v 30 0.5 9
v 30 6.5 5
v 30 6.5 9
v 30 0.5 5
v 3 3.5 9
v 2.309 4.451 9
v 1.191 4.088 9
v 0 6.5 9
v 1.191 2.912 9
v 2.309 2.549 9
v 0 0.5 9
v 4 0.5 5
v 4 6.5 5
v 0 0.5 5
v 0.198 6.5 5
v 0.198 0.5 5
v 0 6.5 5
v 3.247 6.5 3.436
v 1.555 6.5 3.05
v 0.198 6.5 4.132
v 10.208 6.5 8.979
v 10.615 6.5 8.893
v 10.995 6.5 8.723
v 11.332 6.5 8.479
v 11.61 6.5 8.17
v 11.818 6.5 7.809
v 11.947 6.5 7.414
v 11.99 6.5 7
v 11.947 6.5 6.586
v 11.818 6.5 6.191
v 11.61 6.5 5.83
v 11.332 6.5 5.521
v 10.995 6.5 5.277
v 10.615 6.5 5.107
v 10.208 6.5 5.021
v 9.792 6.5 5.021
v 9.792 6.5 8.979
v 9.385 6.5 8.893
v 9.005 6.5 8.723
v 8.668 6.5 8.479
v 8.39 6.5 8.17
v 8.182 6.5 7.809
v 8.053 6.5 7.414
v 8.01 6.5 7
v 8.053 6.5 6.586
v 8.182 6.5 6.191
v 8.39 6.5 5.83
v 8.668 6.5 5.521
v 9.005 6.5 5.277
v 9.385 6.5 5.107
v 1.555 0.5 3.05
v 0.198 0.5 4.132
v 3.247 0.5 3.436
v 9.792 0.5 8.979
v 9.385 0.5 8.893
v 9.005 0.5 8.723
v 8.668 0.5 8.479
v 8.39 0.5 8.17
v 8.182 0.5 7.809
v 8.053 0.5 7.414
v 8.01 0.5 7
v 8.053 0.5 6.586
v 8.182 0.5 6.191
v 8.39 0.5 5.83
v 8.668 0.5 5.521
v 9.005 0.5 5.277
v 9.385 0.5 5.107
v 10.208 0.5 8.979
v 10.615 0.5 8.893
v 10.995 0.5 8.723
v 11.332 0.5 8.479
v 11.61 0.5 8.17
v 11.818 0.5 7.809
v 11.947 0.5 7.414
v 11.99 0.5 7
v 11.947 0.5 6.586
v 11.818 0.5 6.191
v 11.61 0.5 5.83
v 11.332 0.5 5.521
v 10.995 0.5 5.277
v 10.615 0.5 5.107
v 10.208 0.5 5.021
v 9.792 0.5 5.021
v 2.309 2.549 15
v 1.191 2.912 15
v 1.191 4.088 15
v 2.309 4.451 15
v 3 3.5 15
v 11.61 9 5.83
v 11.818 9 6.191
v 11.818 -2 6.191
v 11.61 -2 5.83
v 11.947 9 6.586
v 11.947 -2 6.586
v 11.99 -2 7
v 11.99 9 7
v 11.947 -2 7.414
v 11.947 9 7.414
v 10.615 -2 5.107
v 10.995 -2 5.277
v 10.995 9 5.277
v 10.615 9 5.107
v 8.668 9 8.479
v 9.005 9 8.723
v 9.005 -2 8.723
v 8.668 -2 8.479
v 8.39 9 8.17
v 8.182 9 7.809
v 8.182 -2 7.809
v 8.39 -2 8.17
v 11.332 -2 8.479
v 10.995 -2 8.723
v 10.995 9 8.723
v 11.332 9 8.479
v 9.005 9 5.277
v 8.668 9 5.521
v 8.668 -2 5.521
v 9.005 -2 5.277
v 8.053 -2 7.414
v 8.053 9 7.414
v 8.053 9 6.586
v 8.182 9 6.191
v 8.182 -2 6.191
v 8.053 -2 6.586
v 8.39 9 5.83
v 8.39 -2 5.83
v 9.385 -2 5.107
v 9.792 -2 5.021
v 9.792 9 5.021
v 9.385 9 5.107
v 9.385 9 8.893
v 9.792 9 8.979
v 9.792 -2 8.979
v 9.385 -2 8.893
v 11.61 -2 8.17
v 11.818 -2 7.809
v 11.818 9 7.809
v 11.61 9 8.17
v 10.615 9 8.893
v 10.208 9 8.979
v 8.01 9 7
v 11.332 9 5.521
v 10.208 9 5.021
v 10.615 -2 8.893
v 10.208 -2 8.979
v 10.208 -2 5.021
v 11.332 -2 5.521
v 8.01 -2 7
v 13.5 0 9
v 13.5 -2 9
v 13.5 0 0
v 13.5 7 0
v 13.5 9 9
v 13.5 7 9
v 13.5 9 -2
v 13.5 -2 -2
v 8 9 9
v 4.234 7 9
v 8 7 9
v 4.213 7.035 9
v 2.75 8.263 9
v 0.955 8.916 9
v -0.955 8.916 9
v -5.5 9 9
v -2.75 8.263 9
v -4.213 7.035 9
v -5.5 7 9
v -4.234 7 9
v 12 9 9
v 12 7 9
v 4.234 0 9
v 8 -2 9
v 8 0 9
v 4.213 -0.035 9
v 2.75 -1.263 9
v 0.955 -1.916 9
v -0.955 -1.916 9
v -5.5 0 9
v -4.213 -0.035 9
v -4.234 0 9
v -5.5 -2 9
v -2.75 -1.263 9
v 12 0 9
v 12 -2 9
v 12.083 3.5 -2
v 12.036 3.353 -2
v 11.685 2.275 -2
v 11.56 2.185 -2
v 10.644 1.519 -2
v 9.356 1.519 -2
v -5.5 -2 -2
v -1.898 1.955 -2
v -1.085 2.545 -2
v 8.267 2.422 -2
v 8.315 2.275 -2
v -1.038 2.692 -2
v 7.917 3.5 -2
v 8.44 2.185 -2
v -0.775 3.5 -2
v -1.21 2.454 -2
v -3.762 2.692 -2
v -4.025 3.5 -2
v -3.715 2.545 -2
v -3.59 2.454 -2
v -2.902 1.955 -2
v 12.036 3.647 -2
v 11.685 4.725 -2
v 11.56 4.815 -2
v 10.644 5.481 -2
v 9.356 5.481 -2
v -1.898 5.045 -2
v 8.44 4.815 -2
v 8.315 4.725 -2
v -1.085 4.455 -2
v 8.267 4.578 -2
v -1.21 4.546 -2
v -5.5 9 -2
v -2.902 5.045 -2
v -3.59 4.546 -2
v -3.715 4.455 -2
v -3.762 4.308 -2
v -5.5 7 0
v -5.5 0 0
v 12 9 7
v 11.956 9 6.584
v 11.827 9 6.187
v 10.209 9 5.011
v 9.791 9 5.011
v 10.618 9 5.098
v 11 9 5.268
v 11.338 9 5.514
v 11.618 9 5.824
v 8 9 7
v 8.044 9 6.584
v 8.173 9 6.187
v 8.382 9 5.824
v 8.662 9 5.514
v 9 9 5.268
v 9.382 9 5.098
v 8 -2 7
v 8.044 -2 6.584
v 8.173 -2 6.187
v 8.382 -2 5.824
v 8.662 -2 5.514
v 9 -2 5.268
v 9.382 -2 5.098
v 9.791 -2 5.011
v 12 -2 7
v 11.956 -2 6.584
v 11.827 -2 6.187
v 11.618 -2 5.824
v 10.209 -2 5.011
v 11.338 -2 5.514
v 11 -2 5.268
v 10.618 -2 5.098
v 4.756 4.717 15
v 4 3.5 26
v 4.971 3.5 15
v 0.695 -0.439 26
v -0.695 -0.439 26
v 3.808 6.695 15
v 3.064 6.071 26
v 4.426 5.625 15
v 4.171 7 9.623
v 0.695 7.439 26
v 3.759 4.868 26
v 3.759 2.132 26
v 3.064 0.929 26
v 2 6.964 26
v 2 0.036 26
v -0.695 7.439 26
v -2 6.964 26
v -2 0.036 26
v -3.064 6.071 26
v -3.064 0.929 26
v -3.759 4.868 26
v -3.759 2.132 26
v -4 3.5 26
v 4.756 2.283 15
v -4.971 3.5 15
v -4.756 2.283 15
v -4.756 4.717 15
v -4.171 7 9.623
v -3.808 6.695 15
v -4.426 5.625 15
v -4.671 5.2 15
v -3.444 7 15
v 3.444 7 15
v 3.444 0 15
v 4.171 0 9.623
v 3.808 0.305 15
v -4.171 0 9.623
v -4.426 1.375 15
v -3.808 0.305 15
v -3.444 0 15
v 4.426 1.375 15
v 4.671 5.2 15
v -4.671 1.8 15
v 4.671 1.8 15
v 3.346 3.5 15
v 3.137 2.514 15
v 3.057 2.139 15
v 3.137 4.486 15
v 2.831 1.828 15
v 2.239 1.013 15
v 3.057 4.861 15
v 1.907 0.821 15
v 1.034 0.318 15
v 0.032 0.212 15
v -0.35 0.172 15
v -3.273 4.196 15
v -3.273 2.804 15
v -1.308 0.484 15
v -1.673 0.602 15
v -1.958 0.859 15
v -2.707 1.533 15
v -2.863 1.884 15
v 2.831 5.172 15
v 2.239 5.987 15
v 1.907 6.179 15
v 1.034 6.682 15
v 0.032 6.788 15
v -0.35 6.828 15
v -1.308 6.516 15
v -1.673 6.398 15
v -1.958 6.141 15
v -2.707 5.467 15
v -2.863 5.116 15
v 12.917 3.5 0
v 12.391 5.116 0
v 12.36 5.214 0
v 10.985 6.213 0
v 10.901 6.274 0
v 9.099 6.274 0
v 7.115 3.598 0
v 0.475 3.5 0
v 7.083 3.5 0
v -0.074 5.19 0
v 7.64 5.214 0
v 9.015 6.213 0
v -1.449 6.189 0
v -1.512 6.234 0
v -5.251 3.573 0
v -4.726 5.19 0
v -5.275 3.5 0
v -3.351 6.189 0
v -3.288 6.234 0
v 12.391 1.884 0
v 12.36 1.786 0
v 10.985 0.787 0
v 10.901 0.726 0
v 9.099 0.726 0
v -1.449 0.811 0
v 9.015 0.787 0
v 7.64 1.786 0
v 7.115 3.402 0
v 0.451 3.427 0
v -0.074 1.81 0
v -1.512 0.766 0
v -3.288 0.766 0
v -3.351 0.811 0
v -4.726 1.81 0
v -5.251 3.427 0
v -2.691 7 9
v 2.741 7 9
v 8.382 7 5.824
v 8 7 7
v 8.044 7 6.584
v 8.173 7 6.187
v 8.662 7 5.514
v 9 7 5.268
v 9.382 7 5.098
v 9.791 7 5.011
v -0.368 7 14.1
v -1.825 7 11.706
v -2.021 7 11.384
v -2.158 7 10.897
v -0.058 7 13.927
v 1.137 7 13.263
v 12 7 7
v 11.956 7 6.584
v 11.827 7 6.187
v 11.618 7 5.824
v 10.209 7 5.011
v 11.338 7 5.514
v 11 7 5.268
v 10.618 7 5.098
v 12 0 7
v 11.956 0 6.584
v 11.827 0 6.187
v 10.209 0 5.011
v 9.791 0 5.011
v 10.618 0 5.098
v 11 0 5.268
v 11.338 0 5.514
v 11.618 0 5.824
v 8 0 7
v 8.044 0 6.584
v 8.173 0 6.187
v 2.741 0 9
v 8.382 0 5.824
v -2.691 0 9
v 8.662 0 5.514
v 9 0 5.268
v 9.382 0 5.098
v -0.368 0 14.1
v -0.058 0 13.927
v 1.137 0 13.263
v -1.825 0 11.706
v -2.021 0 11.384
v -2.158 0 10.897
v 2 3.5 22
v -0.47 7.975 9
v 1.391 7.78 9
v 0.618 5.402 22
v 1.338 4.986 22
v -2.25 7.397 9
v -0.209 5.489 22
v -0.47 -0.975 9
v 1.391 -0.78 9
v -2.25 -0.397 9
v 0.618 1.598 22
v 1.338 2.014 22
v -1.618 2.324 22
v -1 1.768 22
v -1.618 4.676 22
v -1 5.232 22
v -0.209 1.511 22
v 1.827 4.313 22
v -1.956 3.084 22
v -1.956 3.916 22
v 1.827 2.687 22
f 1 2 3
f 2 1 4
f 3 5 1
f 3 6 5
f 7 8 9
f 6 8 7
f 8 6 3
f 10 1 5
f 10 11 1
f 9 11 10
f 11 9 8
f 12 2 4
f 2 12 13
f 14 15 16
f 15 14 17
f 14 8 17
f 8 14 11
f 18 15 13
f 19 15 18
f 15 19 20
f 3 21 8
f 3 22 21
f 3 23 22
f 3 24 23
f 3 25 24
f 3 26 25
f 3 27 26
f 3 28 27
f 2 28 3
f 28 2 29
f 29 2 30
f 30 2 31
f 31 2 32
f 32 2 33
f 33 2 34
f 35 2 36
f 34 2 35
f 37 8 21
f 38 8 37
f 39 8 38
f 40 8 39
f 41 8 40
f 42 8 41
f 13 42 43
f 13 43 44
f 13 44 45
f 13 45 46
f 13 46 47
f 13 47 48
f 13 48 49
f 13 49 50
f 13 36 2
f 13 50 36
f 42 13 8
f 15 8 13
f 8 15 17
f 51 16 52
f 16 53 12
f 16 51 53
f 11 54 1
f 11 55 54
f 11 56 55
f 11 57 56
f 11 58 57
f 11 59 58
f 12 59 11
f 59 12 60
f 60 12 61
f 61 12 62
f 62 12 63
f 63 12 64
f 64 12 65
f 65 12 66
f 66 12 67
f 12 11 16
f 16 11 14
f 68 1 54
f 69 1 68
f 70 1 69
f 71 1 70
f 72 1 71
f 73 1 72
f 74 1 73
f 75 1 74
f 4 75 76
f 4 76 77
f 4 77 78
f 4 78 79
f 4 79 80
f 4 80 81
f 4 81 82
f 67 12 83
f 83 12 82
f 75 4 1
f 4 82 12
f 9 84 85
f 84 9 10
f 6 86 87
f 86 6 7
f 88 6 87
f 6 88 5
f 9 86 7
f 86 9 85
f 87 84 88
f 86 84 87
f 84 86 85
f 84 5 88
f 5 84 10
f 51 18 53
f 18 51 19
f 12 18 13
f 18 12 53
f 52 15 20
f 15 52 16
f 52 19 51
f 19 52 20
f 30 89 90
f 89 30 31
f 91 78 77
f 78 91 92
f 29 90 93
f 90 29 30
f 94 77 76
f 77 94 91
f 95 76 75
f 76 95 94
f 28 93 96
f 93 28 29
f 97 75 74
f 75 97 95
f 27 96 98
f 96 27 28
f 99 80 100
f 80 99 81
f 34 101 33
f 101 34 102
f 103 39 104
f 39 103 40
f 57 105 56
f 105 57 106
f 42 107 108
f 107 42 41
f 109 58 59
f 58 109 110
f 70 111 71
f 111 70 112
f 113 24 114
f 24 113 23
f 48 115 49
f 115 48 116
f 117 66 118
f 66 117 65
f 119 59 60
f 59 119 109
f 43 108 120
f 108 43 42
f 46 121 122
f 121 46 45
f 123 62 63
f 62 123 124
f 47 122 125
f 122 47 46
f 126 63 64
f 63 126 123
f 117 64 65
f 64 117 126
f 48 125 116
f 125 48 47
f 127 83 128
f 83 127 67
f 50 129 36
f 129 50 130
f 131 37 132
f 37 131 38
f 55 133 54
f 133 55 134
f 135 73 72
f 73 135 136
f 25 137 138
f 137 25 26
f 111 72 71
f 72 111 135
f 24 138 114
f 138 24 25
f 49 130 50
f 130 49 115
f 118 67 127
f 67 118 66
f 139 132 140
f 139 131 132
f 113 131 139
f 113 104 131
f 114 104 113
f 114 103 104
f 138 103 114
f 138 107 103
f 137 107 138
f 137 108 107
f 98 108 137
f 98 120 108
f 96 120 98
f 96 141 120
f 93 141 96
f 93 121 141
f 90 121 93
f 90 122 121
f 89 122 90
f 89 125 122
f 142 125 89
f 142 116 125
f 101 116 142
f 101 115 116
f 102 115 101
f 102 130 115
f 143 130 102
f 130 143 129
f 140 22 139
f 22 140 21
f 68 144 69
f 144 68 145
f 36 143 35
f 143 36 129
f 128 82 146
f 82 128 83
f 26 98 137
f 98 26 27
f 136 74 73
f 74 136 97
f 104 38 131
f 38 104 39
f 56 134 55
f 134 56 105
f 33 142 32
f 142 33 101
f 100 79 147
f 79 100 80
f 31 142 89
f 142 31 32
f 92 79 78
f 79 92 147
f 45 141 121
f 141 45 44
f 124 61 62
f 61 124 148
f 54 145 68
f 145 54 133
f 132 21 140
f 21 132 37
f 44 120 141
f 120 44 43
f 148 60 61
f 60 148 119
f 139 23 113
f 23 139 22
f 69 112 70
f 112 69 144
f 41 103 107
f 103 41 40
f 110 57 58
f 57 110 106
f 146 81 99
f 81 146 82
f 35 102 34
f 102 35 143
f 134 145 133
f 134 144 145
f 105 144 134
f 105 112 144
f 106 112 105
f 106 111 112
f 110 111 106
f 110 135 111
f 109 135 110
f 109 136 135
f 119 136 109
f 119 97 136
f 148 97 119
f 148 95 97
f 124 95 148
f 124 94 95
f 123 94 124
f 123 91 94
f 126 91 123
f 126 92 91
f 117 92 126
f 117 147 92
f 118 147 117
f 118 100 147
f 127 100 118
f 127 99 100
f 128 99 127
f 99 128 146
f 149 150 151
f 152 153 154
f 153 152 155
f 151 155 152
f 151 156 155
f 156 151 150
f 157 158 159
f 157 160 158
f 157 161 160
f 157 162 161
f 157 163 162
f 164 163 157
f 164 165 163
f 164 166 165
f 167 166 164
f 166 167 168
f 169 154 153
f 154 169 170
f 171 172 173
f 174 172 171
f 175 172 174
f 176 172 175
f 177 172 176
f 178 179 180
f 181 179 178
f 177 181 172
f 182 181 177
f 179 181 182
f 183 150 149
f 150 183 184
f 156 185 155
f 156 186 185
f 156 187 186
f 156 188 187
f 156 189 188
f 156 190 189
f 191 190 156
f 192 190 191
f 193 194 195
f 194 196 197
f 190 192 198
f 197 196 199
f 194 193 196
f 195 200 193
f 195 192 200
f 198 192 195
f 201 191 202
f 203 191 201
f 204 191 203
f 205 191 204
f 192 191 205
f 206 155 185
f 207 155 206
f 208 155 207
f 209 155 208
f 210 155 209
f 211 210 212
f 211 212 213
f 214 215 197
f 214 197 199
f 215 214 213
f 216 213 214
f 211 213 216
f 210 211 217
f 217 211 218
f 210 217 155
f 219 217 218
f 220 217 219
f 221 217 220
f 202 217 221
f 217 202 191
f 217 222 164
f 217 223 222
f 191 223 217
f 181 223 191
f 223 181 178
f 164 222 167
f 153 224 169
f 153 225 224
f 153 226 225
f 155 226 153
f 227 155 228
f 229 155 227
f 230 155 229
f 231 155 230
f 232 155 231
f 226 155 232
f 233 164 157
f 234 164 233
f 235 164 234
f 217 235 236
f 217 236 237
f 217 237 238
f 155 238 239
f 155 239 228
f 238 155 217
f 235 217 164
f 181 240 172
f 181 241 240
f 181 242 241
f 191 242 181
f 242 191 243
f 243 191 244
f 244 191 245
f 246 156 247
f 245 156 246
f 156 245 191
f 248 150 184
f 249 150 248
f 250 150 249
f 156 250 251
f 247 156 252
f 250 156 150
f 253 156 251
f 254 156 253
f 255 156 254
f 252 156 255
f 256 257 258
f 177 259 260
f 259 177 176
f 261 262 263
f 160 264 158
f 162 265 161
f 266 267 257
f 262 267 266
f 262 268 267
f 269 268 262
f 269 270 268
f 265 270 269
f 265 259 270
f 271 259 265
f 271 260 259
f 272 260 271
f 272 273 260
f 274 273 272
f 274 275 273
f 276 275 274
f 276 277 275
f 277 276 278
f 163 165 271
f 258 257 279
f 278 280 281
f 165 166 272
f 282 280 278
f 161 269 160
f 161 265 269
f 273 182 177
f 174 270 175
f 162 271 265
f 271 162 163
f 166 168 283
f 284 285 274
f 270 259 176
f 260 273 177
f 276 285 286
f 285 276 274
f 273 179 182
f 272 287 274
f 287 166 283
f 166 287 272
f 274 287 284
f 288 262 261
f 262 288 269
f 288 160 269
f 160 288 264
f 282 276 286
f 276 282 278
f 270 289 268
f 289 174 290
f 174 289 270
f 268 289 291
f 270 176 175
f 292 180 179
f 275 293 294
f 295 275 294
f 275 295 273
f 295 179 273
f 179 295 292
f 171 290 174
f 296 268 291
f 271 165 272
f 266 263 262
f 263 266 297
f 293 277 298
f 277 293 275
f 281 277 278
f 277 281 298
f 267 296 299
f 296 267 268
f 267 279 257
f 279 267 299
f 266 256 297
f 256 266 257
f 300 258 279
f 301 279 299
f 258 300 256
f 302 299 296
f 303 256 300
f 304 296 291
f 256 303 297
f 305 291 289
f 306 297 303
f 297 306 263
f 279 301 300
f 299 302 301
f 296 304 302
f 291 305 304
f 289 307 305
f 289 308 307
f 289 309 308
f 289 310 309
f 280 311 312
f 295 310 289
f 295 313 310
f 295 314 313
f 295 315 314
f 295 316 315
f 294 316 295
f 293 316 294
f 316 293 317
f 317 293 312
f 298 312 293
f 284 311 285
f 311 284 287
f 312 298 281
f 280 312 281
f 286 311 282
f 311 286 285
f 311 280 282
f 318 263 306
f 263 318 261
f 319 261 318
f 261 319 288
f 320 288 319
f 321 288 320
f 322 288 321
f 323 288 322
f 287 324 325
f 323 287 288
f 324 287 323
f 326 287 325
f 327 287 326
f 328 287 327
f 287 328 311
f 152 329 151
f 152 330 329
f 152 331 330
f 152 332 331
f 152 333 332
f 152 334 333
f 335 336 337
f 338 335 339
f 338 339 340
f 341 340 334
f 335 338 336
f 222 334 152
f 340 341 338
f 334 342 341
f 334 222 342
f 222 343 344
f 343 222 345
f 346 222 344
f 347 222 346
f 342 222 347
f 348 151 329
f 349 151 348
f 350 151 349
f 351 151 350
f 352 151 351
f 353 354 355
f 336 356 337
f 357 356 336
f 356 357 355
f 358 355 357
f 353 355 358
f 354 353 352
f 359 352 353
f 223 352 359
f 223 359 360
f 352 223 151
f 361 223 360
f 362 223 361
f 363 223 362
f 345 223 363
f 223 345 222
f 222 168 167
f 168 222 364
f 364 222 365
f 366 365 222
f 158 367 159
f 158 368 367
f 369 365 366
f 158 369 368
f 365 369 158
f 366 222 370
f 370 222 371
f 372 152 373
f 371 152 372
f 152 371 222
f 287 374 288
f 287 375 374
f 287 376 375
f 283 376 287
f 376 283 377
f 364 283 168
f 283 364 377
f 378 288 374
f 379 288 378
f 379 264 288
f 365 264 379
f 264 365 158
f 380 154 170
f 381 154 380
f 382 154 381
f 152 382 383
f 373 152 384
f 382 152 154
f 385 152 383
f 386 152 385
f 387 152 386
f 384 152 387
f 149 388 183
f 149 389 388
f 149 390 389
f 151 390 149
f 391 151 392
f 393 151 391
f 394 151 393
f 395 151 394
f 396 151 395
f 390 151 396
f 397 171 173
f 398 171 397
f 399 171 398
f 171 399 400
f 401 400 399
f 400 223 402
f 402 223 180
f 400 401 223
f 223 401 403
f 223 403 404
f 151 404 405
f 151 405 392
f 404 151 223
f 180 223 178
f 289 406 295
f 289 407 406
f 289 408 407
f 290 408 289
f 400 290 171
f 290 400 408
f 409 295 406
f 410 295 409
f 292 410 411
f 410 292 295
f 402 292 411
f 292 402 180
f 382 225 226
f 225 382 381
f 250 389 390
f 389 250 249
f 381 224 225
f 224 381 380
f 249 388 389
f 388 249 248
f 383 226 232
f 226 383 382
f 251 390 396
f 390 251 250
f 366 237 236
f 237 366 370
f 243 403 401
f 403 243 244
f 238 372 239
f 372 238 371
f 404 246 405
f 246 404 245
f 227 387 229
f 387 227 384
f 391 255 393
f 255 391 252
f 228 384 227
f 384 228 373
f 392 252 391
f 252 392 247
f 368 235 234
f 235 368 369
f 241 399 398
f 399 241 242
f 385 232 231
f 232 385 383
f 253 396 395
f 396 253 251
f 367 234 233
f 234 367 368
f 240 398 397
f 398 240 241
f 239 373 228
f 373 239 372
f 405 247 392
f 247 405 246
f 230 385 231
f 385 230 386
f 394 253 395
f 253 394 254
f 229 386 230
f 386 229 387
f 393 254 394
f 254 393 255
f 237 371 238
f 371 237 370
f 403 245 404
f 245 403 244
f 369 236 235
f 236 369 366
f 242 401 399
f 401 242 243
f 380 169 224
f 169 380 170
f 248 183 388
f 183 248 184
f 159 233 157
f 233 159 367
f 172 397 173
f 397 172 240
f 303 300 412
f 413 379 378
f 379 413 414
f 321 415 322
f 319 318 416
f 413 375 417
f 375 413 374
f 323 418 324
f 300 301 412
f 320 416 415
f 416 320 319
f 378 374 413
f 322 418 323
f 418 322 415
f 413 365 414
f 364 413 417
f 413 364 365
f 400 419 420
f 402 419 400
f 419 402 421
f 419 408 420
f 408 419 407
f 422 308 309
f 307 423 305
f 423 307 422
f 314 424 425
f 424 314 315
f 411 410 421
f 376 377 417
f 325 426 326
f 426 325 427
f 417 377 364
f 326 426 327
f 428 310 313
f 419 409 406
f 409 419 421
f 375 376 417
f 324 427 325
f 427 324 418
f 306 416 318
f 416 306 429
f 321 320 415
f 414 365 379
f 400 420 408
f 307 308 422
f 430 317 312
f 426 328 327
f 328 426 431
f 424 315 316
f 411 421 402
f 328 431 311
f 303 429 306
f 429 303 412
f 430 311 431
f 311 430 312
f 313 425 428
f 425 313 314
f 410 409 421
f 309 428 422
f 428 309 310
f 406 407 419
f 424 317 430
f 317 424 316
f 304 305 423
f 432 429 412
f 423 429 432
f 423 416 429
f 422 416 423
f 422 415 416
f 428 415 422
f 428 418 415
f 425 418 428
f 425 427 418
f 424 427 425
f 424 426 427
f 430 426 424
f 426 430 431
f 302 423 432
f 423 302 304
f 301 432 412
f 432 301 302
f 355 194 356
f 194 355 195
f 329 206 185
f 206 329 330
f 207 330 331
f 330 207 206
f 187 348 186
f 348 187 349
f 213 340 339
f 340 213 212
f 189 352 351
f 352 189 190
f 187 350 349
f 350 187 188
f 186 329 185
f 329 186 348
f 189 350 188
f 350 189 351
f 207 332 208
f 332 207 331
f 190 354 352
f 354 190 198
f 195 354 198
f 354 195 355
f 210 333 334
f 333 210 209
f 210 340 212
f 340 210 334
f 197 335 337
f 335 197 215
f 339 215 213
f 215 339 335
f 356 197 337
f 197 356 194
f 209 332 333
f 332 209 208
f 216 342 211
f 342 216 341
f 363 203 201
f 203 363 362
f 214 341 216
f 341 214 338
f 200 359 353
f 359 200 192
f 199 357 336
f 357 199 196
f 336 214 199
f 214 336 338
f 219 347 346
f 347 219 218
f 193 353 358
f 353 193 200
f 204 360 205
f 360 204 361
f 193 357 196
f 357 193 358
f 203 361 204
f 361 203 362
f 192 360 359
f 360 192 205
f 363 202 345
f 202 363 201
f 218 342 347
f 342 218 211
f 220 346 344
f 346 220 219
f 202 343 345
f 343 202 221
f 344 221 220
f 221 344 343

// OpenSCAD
hose = 6;
g=2;
ax=10;
hh = hose * 1.5;  //hingeheight
s2a = 15; //spring to axle
barlength = s2a * 2;
sl = 15;   //springlength
sd = 4; //spring diameter
ss = 6;  // spring sprog
w = hose + g + g + g/2;
baselength =  s2a + g+ g;  // length of base

module bar() {
   translate([0,g/4,hh-g-g]){  //move it up to the hinge
        cube ([barlength,hose,g+g]); // main bar
        translate([g,hose/2,g+g])cylinder(r=g/2,h=ss);  //spring sprog
        translate([2,0,0]) rotate([-90,0,0])cylinder(r=g,h=hose); // compression bar
        translate([ax,-g*1.25,g]) rotate([-90,0,0])cylinder(r=g-.01,h=w,$fn=30); //axle
   };    
}

module base(){     //hose holder at bottom
difference() {
    union(){     
        translate([-w/2,-g,-g]) //move back(x) to fit housing and down for thickness
            cube([baselength, w,hh+g]); // base block
        translate([0,w/2-g,hh]) //up to top of block and into middle of hose
            cylinder(r1=w/2, r2= sd/2 +g, h=sl + g);//spring housing cylinder
        }
        translate([-g-w/2,0,0])
            cube([baselength+g+g,w-g-g,hh+ss]);//cut out above hose
        translate([ax,-w-w,hh-g]) 
            rotate([-90,0,0])cylinder(r=g,h=hose+w+w+w+w,$fn=30);//drill out axle
        translate([ax-g,-hose,hh-g])
            cube([g+g,3*w,10]); //cut out bit above axle
         translate([0,w/2-g,hh])
            cylinder(r=w/2-g/2,r2= sd/2 ,h=sl-g);//drill out spring housing
        translate([ax,w/2-g,-g*1.1])
            cylinder(r1= 2,r2=3, h=g*1.2);
        translate([ax,w/2-g,-g*1.1])
            cylinder(r1= 1.5,r2=3, h=g*1.2);
        translate([-w/2  + 3+.1,w/2-g,-g*1.1])
            cylinder(r1= 1.5,r2=3, h=g*1.2);
    }
}

bar();
base();
